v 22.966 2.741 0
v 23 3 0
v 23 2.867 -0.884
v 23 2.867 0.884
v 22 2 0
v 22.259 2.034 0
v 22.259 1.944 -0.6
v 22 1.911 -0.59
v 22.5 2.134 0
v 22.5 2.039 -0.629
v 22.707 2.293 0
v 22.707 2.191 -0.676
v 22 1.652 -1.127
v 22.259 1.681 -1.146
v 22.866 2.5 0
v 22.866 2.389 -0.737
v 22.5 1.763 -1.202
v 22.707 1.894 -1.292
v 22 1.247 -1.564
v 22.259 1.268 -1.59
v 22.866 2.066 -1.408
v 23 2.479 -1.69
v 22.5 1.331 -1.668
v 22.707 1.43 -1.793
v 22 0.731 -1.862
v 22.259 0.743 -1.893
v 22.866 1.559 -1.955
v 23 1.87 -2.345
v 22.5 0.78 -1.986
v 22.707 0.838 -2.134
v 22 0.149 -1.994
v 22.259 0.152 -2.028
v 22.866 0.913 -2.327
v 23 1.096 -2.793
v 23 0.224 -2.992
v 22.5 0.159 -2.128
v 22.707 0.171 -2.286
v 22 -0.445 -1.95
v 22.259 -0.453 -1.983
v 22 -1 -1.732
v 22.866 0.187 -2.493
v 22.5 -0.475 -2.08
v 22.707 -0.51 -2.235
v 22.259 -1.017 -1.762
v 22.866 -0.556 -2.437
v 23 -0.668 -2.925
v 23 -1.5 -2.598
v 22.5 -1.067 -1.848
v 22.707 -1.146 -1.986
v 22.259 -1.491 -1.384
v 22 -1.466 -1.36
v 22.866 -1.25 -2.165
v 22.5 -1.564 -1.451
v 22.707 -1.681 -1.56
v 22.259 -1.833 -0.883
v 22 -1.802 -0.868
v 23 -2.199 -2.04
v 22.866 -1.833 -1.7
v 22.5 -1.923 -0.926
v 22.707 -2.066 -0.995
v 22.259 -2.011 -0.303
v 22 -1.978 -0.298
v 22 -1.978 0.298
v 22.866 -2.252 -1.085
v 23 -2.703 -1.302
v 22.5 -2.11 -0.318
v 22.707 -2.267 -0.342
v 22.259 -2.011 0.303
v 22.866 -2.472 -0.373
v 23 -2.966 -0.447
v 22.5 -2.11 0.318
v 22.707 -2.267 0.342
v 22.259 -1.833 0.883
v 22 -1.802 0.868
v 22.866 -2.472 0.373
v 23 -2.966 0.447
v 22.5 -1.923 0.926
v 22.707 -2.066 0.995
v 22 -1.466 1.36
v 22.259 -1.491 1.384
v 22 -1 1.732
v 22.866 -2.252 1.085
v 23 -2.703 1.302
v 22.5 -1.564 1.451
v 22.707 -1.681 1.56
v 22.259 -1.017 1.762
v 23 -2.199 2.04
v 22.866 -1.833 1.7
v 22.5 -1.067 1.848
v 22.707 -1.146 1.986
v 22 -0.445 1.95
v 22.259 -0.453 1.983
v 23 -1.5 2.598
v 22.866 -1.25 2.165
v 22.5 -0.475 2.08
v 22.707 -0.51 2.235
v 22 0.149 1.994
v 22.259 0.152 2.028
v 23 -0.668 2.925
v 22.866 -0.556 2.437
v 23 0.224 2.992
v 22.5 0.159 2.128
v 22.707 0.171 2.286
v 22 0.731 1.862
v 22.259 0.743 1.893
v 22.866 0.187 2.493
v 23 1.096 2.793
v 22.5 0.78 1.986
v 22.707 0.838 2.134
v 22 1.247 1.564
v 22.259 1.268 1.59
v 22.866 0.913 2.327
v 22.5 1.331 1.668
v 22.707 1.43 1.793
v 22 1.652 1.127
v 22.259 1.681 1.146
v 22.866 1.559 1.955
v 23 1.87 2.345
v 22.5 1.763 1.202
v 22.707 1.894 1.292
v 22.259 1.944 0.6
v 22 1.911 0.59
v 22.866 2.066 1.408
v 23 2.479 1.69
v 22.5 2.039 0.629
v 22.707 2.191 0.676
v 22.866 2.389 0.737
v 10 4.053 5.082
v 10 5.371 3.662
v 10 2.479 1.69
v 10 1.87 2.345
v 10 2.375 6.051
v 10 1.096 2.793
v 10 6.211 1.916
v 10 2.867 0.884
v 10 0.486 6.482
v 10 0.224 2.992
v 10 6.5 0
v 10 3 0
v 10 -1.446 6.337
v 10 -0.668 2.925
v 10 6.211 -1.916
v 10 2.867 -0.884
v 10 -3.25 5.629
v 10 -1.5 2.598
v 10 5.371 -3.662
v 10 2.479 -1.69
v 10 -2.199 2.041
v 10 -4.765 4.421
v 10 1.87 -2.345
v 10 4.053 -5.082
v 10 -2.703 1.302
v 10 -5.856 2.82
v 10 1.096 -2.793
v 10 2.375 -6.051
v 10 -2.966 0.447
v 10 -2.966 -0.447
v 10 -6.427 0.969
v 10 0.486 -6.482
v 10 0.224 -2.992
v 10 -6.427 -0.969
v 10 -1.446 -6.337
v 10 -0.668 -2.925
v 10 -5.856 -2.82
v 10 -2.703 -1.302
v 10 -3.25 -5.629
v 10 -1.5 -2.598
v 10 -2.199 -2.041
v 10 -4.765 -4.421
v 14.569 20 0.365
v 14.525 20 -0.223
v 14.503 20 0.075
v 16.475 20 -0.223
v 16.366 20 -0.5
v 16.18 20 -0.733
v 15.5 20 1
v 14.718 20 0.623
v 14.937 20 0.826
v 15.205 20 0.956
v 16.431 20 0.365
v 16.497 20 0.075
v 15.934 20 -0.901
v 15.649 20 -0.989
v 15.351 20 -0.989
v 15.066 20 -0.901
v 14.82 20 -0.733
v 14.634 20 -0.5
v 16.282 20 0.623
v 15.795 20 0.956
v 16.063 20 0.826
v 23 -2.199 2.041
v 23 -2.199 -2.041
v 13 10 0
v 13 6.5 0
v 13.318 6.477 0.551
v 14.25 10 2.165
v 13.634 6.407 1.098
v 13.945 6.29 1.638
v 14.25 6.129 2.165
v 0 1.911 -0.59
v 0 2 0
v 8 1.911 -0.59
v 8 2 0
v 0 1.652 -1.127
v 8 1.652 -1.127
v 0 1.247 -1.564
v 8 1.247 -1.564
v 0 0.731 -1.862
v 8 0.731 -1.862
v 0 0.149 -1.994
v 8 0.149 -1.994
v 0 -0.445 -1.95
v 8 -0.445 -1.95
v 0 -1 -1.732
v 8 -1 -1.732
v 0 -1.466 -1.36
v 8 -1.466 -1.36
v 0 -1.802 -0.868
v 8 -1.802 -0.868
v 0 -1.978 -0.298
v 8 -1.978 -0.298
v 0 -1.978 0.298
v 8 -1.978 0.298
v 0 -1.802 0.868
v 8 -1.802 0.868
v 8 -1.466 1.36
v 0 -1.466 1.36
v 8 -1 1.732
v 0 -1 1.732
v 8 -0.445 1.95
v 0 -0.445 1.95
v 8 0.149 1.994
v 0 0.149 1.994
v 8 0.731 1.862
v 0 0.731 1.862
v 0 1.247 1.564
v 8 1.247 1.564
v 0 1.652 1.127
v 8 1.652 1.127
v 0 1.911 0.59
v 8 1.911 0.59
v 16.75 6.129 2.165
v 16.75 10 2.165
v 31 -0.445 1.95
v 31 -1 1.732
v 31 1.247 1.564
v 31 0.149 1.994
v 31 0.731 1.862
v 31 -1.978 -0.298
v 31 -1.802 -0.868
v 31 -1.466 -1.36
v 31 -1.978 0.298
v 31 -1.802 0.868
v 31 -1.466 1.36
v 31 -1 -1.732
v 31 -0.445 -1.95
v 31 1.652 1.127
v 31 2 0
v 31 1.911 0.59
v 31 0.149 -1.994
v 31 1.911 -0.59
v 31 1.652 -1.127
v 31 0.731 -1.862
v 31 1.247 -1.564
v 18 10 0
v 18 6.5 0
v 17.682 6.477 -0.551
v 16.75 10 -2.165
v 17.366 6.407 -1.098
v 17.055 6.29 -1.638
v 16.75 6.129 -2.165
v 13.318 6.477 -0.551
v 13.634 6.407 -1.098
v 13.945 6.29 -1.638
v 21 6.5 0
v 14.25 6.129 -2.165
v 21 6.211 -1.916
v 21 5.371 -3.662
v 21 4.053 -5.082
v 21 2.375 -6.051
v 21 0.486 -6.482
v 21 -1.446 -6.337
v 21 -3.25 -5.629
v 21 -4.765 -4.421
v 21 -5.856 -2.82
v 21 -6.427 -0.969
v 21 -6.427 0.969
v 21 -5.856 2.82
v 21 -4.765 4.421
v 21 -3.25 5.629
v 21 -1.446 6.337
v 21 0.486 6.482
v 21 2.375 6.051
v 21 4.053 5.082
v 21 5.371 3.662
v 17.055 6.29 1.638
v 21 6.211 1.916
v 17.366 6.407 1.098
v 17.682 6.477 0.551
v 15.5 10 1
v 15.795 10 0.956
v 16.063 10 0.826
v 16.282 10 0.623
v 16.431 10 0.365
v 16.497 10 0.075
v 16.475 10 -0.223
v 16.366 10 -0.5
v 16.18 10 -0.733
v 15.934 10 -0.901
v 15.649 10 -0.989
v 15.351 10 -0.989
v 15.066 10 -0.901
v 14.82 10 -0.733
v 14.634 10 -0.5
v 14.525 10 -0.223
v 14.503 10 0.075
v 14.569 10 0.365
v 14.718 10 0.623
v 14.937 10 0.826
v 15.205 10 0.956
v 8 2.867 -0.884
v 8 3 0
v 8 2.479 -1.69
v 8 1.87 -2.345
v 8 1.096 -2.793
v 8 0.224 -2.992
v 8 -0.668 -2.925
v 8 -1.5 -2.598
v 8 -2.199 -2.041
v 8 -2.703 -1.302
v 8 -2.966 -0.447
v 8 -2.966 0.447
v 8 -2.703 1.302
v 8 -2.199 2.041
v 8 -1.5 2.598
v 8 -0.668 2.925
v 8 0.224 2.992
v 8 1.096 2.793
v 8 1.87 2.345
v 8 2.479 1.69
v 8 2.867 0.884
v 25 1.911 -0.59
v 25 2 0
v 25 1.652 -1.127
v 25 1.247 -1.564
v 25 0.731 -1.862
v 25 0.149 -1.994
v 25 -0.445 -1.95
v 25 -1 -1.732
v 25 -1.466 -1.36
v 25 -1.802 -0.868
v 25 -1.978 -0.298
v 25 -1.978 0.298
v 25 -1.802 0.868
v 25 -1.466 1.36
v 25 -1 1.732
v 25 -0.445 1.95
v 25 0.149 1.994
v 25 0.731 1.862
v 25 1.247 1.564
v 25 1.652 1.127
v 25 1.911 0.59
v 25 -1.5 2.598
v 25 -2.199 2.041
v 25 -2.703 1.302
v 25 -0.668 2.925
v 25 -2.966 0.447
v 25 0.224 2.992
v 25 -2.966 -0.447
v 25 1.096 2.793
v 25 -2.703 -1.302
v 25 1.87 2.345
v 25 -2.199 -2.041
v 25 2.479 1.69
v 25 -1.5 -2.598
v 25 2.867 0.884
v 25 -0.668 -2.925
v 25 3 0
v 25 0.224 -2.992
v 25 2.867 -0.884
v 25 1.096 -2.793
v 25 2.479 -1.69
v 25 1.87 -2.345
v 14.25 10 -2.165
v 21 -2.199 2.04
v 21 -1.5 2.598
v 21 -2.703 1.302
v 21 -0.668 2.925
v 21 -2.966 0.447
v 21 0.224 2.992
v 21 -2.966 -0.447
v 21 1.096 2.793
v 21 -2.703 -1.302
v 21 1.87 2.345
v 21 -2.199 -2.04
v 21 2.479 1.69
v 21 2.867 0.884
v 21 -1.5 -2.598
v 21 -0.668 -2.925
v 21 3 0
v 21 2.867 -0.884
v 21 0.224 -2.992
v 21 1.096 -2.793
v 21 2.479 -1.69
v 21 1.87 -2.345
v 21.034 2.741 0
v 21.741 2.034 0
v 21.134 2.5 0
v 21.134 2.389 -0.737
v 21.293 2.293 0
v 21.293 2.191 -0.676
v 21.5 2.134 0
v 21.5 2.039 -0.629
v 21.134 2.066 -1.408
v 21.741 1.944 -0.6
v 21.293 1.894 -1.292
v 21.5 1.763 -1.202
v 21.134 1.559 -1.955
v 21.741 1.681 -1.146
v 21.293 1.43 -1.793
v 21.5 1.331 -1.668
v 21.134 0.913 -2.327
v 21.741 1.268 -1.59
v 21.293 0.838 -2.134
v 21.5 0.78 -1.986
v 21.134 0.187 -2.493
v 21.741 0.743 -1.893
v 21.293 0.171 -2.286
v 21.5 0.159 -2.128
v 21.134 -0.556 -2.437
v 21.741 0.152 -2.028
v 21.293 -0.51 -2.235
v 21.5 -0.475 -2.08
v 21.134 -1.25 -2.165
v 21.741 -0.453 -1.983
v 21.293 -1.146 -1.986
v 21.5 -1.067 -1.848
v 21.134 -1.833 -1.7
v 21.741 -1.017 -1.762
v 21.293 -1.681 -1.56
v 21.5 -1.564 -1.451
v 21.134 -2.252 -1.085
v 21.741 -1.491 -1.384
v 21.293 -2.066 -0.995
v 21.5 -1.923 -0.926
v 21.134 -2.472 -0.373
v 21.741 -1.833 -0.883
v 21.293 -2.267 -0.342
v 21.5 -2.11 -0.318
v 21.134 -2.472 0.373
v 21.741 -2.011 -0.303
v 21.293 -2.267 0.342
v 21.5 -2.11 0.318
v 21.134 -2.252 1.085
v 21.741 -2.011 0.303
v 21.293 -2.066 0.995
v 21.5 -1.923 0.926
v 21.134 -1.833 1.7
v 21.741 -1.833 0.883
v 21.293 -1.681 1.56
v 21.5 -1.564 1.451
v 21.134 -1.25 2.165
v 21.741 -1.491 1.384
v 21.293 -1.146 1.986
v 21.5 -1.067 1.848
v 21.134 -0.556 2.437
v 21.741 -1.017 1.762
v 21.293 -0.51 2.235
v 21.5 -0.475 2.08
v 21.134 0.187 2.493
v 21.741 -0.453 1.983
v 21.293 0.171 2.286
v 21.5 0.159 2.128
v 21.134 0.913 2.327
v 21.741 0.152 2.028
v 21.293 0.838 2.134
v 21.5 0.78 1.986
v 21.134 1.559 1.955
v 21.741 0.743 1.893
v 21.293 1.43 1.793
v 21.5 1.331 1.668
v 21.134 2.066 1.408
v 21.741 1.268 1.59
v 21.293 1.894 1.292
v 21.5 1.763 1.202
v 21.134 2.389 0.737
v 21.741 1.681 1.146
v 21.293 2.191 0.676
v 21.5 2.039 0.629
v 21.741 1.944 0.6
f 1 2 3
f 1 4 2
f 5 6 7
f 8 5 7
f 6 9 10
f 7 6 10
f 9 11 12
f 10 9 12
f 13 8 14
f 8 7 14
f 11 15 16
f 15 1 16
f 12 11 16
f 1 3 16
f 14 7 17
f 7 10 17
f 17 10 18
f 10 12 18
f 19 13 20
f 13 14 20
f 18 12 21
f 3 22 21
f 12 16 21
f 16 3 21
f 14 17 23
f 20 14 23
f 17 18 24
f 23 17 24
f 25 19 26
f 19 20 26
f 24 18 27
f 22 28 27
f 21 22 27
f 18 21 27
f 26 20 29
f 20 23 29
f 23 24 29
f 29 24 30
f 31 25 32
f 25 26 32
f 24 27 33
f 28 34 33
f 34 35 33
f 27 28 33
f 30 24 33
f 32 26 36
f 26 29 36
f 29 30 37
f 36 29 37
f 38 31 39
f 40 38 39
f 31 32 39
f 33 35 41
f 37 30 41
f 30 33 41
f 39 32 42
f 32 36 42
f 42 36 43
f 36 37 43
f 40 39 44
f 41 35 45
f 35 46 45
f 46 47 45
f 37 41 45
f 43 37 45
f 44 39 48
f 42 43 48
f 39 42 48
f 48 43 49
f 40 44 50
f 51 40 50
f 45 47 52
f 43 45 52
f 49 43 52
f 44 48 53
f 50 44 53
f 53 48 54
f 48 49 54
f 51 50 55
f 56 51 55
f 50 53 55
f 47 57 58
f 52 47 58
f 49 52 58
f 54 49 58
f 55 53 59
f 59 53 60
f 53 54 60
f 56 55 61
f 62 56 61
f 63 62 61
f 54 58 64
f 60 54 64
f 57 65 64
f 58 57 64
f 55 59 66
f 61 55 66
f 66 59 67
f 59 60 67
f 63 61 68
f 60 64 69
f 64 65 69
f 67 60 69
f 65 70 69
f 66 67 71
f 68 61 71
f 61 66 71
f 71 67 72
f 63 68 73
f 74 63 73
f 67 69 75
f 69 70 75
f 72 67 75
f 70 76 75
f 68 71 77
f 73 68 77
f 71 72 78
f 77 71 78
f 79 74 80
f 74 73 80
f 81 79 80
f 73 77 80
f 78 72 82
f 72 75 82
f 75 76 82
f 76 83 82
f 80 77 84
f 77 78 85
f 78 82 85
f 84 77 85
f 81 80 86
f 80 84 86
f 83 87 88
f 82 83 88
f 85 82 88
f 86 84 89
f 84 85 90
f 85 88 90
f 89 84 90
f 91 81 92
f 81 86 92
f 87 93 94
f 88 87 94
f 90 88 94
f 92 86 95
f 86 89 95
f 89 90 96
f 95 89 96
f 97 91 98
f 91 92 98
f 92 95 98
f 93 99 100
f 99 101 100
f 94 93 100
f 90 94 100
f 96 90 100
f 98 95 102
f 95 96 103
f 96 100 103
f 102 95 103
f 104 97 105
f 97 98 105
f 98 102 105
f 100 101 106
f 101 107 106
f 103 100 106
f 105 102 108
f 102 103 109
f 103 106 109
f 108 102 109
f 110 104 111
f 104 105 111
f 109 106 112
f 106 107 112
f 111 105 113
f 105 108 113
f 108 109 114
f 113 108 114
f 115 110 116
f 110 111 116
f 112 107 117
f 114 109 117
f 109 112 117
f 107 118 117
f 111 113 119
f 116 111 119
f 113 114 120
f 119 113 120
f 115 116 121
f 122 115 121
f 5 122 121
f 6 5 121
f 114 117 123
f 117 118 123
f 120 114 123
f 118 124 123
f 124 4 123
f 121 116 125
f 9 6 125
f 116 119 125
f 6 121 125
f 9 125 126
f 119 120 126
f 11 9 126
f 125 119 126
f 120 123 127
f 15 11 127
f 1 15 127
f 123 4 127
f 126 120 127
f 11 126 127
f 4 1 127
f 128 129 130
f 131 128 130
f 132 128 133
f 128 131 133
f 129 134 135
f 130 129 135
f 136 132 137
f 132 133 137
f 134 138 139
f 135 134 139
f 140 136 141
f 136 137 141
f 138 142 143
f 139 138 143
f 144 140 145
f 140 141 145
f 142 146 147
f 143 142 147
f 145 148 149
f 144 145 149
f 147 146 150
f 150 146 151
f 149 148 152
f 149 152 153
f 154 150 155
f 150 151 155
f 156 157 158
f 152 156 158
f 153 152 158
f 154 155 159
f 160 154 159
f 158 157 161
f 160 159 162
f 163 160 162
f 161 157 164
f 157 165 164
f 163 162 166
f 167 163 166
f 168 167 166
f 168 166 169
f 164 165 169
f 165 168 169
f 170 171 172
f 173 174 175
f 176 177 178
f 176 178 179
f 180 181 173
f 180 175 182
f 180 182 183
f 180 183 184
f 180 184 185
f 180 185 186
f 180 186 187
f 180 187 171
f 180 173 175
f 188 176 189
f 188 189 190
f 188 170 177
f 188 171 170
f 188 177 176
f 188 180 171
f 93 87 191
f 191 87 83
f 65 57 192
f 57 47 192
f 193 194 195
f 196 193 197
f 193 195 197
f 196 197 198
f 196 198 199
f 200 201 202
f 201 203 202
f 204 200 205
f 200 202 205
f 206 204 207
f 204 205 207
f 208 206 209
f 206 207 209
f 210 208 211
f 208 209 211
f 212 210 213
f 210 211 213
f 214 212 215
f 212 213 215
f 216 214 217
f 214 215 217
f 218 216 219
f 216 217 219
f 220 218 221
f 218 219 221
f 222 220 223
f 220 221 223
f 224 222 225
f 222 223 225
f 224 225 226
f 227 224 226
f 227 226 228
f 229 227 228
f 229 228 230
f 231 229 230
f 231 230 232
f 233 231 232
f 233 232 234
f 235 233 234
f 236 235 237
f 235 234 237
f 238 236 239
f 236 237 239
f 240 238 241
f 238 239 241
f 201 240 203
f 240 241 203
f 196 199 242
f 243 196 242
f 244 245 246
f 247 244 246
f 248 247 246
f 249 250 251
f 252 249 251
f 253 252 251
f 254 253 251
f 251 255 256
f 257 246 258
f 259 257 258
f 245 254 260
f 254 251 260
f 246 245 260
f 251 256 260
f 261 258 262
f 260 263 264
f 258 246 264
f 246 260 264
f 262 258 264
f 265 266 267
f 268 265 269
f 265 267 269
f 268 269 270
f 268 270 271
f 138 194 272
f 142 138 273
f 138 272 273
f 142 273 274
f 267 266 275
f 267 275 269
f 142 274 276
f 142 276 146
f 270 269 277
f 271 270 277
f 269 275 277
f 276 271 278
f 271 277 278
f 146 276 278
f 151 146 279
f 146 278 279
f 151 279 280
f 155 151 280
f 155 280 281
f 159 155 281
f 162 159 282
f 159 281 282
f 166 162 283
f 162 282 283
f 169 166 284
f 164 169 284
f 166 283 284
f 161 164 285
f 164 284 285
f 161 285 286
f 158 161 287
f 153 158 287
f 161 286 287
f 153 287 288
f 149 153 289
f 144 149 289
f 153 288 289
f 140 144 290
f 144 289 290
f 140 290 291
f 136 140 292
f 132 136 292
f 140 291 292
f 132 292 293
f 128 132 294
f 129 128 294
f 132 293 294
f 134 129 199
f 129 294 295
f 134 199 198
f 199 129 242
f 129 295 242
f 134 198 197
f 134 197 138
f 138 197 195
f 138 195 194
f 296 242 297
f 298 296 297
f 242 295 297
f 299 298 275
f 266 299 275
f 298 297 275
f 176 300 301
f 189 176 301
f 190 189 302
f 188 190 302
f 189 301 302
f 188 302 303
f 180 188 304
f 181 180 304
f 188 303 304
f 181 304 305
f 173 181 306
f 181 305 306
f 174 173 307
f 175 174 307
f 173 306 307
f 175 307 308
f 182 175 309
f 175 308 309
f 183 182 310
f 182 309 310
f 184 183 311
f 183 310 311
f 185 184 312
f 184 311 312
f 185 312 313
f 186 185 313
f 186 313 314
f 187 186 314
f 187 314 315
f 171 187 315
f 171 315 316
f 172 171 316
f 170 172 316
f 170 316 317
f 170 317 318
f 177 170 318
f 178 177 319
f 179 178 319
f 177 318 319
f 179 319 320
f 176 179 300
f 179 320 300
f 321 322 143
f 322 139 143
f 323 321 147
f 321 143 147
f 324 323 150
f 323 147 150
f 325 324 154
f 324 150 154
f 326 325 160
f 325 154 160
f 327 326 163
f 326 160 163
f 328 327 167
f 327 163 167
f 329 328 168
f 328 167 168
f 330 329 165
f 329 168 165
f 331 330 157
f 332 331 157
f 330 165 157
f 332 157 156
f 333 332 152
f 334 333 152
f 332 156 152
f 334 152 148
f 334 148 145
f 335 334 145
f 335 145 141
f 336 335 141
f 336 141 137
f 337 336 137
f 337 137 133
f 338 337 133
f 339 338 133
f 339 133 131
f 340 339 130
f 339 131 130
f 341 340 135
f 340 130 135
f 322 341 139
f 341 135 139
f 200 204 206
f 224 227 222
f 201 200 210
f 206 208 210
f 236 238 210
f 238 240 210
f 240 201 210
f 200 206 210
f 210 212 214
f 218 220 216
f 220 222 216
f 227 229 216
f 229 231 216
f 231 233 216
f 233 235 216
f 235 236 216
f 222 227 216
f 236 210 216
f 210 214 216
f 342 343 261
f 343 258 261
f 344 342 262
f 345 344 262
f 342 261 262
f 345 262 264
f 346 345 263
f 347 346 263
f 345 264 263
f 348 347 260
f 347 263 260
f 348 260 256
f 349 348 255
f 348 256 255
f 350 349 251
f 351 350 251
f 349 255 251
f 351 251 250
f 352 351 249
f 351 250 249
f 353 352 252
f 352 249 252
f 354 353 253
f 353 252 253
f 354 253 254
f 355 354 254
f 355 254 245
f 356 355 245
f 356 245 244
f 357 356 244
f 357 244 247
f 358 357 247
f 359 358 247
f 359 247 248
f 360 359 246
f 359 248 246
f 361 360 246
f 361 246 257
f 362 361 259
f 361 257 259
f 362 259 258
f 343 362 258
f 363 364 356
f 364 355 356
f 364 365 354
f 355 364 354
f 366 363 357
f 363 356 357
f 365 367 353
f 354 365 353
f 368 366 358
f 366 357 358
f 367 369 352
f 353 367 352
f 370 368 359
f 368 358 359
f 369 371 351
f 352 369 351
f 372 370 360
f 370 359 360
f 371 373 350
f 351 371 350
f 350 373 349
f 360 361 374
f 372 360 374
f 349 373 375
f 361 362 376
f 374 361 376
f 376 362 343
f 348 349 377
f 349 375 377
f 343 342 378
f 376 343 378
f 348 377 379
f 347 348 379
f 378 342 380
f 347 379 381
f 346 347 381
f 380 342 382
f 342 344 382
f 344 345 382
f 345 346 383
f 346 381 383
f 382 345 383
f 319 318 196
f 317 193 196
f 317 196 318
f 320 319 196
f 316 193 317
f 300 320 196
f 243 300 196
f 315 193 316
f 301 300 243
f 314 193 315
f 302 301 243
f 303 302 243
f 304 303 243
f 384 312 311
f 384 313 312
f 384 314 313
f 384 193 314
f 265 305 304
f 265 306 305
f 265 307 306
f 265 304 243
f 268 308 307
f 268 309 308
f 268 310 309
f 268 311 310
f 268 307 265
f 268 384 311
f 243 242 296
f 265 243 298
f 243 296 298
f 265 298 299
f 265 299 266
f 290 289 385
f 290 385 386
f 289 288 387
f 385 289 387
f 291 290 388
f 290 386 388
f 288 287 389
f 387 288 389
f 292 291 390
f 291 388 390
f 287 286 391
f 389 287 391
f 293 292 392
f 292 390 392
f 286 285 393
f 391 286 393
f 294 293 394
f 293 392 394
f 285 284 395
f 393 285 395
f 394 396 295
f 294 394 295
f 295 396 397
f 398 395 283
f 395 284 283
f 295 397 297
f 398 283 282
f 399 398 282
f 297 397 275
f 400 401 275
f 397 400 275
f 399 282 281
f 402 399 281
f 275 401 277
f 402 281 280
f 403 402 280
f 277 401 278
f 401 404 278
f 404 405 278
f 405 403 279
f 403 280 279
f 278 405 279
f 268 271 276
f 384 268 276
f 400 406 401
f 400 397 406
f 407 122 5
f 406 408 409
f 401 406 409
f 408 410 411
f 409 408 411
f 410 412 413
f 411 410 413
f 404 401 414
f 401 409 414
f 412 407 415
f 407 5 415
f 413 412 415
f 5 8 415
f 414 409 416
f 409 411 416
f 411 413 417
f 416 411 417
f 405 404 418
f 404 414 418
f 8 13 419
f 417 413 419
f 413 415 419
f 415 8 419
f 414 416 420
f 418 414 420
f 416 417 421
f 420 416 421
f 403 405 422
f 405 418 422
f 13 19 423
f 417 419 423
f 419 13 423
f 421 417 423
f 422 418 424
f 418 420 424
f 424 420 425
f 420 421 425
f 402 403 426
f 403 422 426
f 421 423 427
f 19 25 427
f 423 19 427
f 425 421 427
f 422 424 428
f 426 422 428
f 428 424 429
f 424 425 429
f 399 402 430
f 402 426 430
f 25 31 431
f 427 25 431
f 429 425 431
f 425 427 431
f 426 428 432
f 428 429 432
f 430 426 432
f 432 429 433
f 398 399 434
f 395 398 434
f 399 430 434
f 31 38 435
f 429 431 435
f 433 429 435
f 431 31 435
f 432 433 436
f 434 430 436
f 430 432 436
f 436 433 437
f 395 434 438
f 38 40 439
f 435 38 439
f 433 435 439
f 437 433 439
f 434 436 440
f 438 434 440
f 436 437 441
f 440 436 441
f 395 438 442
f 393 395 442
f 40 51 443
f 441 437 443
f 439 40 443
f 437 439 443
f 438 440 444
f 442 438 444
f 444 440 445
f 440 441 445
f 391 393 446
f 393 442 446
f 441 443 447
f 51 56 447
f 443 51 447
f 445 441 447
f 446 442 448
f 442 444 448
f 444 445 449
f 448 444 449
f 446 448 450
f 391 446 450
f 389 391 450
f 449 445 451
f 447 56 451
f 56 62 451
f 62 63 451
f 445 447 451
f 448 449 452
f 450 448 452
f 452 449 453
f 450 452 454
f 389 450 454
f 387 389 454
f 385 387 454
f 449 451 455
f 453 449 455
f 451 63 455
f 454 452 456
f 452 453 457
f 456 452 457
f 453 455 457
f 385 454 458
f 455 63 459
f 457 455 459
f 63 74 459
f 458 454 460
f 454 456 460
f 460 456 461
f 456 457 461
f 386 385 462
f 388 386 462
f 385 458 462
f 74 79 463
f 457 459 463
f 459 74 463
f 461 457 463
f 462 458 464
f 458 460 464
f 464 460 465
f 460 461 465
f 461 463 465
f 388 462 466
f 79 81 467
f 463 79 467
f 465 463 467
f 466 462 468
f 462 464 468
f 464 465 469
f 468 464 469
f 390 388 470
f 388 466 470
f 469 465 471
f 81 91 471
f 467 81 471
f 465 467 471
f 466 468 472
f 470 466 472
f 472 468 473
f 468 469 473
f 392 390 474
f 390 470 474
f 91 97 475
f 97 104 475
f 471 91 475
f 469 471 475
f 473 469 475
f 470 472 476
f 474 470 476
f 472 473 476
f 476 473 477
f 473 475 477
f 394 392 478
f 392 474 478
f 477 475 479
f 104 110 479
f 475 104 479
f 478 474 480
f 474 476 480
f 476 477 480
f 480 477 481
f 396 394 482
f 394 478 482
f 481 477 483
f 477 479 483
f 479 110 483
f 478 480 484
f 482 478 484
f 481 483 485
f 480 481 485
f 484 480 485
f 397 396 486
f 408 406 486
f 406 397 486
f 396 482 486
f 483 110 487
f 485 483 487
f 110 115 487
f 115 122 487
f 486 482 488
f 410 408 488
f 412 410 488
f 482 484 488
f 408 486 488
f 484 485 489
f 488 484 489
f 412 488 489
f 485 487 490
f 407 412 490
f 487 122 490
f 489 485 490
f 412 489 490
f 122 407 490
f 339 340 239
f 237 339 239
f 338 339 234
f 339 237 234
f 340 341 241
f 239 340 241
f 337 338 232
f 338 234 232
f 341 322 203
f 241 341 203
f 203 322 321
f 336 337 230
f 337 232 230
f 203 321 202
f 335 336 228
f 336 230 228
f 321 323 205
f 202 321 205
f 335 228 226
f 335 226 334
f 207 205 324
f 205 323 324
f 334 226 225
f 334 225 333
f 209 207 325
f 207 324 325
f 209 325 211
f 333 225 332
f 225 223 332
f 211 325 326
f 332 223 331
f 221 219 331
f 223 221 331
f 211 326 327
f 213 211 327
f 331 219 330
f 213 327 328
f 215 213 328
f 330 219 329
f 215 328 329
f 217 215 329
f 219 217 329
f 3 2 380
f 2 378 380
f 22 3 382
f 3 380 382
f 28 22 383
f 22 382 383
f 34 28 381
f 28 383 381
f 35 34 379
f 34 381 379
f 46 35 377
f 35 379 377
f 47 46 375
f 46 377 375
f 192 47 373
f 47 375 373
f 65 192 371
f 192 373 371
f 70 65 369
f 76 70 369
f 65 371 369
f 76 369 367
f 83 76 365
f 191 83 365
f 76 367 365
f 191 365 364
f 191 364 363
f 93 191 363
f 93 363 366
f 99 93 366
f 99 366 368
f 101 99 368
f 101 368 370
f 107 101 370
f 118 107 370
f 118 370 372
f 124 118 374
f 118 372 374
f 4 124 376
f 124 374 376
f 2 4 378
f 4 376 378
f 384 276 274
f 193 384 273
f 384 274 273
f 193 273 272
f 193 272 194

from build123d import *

# Parameters (mm, degrees)
FILLET1_R           = 1
BOSS_EXTRUDE1_DEPTH = 10
SKETCH4_R           = 1
BOSS_EXTRUDE2_DEPTH = 10


with BuildPart() as part:
    # Sketch2 → Revolve1 (revolve)
    with BuildSketch(Plane.XY):
        Polygon((0, 0), (0, 2), (8, 2), (8, 3), (10, 3), (10, 6.5), (21, 6.5), (21, 2), (23, 2), (23, 3), (25, 3), (25, 2), (31, 2), (31, 0), align=None)
    revolve(axis=Axis((31, 0, 0), (-1, 0, 0)))

    # Fillet1
    fillet1_edges = [part.edges().sort_by_distance(p)[0] for p in [
        (23, -2, 0),
        (21, -2, 0),
    ]]
    fillet(fillet1_edges, radius=FILLET1_R - 0.0001)  # a hair under: the kernel refuses the full size

    # Sketch3 → Boss-Extrude1 (add)
    with BuildSketch(Plane(origin=(0, 0, 0), x_dir=(1, 0, 0), z_dir=(0, 1, 0))):
        Polygon((16.75, 2.165063509), (14.25, 2.165063509), (13, 0), (14.25, -2.165063509), (16.75, -2.165063509), (18, 0), align=None)
    extrude(amount=BOSS_EXTRUDE1_DEPTH)

    # Sketch4 → Boss-Extrude2 (add)
    with BuildSketch(Plane(origin=(0, 10, 0), x_dir=(1, 0, 0), z_dir=(0, 1, 0))):
        with Locations(Location((15.5, 0, 0), (0, 0, 270))):
            Circle(SKETCH4_R)
    extrude(amount=BOSS_EXTRUDE2_DEPTH)


solid = part.part
